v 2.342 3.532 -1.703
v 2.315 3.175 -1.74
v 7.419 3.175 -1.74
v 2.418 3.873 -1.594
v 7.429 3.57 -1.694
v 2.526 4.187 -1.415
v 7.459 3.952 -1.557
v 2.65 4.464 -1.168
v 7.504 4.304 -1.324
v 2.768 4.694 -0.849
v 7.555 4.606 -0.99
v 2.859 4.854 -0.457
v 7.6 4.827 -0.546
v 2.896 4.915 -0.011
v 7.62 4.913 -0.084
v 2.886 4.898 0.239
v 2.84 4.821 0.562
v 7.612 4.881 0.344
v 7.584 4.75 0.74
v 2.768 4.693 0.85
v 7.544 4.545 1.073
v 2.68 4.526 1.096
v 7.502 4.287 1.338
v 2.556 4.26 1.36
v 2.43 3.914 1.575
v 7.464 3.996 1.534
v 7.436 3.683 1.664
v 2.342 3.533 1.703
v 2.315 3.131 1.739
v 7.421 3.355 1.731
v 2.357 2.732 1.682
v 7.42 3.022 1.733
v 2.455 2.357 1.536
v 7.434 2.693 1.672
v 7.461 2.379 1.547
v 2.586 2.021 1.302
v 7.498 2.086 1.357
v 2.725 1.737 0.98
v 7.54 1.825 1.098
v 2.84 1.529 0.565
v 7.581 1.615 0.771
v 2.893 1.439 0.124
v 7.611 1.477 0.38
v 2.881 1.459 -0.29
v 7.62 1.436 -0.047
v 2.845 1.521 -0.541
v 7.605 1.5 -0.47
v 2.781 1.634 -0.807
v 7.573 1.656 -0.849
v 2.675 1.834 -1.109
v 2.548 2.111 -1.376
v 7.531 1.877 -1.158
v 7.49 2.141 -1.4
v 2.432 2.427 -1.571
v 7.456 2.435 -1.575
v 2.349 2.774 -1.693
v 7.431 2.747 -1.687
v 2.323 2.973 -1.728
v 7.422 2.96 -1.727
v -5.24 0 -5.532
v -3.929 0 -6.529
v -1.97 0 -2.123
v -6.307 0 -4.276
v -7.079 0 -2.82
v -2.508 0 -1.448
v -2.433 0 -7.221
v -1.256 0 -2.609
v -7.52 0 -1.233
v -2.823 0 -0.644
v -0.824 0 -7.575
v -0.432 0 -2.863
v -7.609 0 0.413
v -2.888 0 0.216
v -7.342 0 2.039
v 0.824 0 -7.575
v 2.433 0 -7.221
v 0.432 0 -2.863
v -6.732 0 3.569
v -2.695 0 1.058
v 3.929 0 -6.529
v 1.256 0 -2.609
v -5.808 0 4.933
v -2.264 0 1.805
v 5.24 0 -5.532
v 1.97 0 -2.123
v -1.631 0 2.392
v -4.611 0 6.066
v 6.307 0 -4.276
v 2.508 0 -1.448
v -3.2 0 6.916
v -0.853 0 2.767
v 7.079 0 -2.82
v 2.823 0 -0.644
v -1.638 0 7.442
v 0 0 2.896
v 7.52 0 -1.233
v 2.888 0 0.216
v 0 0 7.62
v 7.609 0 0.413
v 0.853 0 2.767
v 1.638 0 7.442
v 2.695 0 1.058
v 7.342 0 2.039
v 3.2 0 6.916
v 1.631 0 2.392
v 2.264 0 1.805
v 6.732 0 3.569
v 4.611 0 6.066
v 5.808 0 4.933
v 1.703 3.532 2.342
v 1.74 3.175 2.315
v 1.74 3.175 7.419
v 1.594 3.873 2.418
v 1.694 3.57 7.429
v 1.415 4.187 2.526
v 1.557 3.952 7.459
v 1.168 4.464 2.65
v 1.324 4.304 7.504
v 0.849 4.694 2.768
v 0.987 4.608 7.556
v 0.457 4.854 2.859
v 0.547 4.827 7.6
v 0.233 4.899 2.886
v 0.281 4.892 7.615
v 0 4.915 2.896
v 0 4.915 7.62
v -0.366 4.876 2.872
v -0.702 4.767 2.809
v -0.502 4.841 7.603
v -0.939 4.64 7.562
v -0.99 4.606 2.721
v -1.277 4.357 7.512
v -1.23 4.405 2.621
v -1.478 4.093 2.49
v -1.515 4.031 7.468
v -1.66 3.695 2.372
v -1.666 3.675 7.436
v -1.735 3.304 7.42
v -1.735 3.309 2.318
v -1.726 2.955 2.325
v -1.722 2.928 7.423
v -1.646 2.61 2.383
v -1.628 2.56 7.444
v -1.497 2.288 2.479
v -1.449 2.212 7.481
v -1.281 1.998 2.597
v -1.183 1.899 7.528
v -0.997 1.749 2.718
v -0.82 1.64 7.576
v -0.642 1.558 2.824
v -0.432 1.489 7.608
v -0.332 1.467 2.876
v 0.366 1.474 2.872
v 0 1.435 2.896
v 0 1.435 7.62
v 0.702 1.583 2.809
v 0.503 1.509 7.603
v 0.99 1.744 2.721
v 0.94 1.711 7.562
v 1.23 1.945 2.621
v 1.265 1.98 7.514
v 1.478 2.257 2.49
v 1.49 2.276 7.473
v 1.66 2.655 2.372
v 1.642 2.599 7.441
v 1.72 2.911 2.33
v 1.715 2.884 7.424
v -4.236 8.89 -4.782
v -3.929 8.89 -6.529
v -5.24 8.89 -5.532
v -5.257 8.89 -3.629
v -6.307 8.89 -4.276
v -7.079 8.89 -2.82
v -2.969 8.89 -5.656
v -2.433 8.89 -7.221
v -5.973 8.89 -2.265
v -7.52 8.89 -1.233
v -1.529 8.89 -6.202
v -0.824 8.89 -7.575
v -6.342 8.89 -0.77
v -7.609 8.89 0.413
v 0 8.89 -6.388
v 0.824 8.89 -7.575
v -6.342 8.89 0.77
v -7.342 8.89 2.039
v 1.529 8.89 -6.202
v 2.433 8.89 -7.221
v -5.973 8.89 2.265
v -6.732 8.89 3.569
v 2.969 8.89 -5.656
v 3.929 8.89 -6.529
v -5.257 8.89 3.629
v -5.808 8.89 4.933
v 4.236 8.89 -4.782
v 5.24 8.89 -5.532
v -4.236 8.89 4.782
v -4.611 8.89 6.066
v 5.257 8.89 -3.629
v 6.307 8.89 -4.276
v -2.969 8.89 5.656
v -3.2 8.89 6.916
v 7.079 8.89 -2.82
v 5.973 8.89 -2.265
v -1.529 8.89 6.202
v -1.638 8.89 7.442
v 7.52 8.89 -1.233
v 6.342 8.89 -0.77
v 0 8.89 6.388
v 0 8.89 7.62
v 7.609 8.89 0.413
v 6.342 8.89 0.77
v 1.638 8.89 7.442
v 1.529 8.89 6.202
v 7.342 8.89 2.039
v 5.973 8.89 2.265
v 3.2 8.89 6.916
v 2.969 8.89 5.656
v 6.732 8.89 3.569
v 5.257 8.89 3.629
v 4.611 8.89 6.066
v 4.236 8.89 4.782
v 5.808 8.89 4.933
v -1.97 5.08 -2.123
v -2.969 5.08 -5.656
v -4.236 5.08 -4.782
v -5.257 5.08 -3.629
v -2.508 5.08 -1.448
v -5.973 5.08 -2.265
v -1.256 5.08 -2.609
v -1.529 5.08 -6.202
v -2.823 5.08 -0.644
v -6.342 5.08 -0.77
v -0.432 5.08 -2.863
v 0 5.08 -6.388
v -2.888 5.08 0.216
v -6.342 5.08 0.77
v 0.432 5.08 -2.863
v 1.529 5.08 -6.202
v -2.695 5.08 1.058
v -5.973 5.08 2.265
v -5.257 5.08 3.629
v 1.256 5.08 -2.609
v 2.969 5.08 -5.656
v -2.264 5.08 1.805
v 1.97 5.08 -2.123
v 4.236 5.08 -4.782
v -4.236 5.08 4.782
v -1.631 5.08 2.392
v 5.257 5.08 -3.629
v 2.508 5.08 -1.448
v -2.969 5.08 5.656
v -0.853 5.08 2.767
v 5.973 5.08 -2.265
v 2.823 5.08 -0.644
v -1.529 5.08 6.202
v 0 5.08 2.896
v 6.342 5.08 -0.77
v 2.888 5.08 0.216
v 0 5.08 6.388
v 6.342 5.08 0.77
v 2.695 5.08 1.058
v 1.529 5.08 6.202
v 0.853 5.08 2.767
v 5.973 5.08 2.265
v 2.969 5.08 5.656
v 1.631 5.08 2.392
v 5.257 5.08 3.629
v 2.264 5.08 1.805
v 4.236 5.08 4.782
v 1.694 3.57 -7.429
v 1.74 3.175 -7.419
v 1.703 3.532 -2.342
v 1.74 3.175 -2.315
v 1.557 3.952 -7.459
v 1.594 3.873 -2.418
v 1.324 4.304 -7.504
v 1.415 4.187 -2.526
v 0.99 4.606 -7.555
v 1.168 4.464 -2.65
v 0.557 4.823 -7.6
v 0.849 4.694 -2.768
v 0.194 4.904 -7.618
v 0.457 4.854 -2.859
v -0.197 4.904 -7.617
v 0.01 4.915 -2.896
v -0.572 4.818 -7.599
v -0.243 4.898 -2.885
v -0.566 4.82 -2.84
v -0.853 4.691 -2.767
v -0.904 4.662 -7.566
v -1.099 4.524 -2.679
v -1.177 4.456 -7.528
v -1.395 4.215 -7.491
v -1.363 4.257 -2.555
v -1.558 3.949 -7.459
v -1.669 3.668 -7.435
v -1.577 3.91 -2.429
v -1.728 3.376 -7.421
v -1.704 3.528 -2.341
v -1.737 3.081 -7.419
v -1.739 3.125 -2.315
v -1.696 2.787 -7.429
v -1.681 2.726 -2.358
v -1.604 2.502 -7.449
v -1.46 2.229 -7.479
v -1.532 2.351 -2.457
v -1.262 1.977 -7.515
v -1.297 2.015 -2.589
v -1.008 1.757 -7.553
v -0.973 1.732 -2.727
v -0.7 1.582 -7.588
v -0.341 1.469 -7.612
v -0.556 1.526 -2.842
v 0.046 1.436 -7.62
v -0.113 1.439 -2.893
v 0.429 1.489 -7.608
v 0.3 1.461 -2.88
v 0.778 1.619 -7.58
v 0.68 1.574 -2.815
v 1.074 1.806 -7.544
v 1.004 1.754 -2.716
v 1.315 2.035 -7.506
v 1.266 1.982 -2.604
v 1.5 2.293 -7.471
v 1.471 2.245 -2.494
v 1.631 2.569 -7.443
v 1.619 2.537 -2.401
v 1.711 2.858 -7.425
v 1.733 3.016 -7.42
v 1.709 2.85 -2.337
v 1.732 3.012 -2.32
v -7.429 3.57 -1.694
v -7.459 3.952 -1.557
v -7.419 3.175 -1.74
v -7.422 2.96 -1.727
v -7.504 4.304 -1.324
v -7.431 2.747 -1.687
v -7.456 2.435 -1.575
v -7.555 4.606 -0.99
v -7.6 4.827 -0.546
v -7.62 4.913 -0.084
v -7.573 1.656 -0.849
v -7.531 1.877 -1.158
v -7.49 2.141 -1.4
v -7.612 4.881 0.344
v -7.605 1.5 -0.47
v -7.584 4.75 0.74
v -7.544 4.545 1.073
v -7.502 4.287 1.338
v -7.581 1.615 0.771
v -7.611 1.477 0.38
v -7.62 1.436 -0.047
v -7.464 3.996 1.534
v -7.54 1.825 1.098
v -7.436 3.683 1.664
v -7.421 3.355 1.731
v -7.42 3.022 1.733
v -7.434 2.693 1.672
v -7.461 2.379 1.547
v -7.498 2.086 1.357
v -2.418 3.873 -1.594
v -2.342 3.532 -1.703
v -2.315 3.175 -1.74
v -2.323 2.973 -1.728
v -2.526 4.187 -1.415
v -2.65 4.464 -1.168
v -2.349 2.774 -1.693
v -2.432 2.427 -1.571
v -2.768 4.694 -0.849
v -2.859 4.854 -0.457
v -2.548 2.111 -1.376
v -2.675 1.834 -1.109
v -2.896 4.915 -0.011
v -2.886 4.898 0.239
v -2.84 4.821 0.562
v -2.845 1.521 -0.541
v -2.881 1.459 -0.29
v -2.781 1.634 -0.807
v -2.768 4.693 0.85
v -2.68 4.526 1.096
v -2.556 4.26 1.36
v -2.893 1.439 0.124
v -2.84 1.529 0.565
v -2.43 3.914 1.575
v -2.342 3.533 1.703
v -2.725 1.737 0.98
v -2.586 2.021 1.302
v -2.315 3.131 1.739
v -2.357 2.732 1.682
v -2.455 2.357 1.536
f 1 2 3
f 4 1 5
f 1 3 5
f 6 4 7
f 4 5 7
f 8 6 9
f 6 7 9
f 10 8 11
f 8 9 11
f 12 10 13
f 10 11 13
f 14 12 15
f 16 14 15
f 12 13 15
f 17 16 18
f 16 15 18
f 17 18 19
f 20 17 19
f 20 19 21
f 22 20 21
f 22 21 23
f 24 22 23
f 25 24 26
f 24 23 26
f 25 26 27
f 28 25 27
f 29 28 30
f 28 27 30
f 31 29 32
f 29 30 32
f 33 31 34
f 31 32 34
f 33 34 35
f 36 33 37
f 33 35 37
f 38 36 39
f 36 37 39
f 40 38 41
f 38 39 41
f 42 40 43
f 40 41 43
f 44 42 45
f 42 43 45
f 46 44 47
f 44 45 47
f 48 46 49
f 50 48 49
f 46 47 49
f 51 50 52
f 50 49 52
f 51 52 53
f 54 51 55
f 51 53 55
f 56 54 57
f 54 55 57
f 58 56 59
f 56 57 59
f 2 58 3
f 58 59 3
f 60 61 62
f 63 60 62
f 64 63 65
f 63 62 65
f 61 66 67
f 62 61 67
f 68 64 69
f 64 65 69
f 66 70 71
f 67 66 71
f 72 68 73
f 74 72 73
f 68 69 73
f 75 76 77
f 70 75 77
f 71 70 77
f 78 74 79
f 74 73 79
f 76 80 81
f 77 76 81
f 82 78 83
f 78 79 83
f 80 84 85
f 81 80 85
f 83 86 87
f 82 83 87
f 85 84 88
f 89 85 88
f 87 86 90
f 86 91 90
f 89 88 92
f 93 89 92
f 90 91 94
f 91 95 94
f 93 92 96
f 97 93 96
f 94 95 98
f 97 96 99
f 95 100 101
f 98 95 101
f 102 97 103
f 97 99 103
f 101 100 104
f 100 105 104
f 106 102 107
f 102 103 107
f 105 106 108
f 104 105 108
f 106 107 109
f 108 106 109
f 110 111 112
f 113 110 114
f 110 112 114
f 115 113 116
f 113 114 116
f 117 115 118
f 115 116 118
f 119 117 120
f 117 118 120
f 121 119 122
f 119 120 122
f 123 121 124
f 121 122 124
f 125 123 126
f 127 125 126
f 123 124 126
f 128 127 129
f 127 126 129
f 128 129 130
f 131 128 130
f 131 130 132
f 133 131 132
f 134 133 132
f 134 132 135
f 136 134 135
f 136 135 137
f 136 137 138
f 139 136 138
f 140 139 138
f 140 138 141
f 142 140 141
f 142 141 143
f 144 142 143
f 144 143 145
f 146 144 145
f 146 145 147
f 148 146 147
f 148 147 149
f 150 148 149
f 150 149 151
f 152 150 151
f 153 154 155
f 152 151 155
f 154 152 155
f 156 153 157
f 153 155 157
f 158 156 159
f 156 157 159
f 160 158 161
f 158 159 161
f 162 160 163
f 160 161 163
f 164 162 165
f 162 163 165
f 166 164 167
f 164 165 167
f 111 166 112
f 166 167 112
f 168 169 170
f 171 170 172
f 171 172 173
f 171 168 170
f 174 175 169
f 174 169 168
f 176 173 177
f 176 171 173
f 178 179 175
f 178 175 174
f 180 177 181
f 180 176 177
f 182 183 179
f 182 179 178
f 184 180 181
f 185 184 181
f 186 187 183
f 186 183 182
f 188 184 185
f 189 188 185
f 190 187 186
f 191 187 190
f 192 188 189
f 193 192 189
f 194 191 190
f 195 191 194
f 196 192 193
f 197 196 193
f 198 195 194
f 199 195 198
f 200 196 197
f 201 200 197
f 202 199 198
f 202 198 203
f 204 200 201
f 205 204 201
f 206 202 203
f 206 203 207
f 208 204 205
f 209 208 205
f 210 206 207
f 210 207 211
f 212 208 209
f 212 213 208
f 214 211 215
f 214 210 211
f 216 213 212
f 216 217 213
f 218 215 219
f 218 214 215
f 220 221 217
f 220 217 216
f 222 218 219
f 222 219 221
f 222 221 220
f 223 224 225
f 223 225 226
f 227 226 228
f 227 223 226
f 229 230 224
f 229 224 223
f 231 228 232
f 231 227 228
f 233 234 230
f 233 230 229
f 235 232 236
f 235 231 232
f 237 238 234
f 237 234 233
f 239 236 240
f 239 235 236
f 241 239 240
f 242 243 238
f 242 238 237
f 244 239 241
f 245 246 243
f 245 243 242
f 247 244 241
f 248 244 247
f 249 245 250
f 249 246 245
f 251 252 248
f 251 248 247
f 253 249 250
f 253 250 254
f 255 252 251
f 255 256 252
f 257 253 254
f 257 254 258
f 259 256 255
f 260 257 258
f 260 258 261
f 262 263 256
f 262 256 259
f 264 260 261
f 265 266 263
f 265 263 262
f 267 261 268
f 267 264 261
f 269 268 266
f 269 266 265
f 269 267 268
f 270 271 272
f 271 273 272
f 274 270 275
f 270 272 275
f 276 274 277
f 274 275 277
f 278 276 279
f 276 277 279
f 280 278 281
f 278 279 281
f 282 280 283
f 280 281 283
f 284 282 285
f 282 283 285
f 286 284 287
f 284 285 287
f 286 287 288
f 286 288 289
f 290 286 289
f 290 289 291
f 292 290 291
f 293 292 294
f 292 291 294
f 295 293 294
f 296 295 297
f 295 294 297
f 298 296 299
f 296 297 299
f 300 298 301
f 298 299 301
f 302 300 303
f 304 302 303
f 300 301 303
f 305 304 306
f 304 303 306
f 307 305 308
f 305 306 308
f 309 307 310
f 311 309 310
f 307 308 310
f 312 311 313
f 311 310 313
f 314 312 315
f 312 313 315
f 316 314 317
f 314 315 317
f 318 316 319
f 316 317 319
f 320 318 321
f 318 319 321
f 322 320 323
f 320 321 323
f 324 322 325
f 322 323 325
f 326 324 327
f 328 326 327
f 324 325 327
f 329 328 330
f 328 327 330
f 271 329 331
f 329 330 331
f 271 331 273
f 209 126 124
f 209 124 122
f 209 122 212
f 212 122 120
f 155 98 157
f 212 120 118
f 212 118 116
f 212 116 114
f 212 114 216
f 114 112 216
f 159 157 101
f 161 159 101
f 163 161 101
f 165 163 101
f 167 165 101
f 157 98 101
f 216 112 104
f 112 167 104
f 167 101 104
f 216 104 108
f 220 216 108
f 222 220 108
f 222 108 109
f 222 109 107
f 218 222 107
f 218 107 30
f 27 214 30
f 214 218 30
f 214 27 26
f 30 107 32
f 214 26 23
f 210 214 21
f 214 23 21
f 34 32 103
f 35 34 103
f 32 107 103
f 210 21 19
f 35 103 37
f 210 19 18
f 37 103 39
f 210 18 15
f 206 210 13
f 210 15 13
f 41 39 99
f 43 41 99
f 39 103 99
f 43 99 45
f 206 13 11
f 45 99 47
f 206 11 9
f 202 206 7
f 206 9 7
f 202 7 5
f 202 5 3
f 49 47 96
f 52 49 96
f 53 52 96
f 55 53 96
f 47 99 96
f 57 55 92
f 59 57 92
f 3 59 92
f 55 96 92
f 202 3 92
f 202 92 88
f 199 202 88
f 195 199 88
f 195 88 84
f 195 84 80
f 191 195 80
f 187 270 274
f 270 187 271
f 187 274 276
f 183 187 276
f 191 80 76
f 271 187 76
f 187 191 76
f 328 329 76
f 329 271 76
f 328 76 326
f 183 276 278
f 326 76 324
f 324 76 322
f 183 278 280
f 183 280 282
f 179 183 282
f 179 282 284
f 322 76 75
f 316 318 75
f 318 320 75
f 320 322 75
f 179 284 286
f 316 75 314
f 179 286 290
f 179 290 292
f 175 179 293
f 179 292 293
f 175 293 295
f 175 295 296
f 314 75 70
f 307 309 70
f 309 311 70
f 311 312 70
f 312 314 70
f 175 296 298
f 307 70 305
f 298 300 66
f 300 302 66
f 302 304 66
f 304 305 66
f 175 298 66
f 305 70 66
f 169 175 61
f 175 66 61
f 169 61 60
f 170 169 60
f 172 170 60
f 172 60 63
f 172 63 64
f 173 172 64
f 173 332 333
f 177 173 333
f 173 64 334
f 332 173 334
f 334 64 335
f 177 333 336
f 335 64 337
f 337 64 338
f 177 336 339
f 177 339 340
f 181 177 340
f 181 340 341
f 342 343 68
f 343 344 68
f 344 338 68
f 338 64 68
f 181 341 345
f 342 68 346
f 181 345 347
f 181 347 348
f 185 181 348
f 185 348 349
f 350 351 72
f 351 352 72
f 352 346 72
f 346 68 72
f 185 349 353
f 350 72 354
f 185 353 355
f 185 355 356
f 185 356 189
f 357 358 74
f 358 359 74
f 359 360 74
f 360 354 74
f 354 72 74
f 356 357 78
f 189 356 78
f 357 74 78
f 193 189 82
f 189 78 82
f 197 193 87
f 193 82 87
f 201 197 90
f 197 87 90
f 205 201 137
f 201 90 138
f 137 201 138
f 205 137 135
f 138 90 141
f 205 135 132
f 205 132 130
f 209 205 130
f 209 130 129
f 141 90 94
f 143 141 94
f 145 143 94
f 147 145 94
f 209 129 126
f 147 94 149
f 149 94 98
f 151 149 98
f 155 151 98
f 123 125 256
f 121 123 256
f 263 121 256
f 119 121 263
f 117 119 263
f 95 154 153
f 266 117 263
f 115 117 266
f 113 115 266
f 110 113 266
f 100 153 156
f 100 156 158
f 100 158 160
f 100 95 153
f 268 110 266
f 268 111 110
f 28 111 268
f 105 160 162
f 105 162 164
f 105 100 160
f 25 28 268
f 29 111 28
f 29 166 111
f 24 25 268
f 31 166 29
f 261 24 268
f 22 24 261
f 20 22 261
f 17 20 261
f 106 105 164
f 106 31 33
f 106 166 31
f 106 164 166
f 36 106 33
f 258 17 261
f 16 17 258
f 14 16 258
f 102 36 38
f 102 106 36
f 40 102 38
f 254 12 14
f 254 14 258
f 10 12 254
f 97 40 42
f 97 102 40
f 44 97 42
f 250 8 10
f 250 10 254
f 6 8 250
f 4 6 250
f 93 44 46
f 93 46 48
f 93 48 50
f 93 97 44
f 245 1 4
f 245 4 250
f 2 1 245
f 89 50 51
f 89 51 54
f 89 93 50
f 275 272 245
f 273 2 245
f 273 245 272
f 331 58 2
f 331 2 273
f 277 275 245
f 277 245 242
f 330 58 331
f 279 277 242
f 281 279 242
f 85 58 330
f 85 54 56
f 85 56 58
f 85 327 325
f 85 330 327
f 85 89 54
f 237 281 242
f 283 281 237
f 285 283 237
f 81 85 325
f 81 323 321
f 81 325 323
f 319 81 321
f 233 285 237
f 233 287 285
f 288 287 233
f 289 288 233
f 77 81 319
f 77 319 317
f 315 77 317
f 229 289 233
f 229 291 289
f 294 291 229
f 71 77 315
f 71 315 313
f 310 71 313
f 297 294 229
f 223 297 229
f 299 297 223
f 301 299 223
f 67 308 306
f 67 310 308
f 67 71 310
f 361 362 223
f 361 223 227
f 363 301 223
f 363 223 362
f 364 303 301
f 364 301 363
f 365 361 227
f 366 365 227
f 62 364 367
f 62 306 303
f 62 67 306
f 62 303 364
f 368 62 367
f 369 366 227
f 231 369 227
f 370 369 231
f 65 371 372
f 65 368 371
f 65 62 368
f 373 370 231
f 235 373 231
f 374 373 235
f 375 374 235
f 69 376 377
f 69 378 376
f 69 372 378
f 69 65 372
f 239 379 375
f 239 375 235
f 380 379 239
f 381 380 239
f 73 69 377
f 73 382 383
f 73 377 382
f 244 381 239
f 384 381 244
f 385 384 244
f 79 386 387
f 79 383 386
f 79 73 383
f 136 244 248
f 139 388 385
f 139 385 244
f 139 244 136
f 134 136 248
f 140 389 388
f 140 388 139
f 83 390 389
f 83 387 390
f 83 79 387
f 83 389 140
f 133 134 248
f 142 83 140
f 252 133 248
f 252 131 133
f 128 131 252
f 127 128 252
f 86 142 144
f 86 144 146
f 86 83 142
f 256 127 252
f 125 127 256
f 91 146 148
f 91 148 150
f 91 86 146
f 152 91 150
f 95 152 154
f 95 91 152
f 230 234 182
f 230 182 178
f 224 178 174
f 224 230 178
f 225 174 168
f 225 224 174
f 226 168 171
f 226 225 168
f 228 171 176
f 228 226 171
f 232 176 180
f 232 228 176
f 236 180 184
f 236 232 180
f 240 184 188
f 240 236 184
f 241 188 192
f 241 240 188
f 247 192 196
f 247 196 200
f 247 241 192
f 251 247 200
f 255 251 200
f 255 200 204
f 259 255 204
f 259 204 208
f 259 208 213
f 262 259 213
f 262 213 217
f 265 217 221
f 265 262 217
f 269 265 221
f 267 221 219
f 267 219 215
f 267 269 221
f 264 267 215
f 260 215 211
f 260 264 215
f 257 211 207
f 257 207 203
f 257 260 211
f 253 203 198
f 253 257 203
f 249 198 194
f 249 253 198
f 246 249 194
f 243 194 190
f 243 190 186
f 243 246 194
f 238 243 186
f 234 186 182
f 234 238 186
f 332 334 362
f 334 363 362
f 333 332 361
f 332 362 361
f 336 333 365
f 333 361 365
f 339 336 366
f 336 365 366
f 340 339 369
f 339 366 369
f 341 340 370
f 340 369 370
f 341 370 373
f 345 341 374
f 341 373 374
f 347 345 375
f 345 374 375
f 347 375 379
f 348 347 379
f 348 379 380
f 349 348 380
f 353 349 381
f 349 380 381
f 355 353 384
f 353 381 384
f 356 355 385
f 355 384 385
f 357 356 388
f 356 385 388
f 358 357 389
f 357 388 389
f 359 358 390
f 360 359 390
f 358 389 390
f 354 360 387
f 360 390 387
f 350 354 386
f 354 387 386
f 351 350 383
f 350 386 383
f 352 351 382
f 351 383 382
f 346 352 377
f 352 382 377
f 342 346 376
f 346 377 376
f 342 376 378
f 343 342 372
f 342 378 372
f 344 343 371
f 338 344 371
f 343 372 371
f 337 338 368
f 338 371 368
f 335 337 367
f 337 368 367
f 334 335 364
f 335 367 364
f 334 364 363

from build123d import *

# Parameters (mm, degrees)
SKETCH1_R           = 7.62
SKETCH1_R_2         = 2.8956
BOSS_EXTRUDE1_DEPTH = 5.08
SKETCH2_R           = 7.62
SKETCH2_R_2         = 6.3881
BOSS_EXTRUDE2_DEPTH = 3.81
SKETCH3_R           = 1.7399
CUT_EXTRUDE1_DEPTH  = 12.7
SKETCH4_R           = 1.7399
CUT_EXTRUDE2_DEPTH  = 12.7


with BuildPart() as part:
    # Sketch1 → Boss-Extrude1 (new body)
    with BuildSketch(Plane(origin=(0, 0, 0), x_dir=(1, 0, 0), z_dir=(0, 1, 0))):
        with Locations(Location((0, 0, 0), (0, 0, 270))):
            Circle(SKETCH1_R)
        with Locations(Location((0, 0, 0), (0, 0, 270))):
            Circle(SKETCH1_R_2, mode=Mode.SUBTRACT)
    extrude(amount=BOSS_EXTRUDE1_DEPTH)

    # Sketch2 → Boss-Extrude2 (add)
    with BuildSketch(Plane(origin=(0, 5.08, 0), x_dir=(1, 0, 0), z_dir=(0, 1, 0))):
        with Locations(Location((0, 0, 0), (0, 0, 270))):
            Circle(SKETCH2_R)
        with Locations(Location((0, 0, 0), (0, 0, 90))):
            Circle(SKETCH2_R_2, mode=Mode.SUBTRACT)
    extrude(amount=BOSS_EXTRUDE2_DEPTH)

    # Sketch3 → Cut-Extrude1 (cut, symmetric)
    with BuildSketch(Plane.XY):
        with Locations((0, 3.175)):
            Circle(SKETCH3_R)
    extrude(amount=CUT_EXTRUDE1_DEPTH, both=True, mode=Mode.SUBTRACT)

    # Sketch4 → Cut-Extrude2 (cut, symmetric)
    with BuildSketch(Plane(origin=(0, 0, 0), x_dir=(0, 0, -1), z_dir=(1, 0, 0))):
        with Locations((0, 3.175)):
            Circle(SKETCH4_R)
    extrude(amount=CUT_EXTRUDE2_DEPTH, both=True, mode=Mode.SUBTRACT)


solid = part.part
